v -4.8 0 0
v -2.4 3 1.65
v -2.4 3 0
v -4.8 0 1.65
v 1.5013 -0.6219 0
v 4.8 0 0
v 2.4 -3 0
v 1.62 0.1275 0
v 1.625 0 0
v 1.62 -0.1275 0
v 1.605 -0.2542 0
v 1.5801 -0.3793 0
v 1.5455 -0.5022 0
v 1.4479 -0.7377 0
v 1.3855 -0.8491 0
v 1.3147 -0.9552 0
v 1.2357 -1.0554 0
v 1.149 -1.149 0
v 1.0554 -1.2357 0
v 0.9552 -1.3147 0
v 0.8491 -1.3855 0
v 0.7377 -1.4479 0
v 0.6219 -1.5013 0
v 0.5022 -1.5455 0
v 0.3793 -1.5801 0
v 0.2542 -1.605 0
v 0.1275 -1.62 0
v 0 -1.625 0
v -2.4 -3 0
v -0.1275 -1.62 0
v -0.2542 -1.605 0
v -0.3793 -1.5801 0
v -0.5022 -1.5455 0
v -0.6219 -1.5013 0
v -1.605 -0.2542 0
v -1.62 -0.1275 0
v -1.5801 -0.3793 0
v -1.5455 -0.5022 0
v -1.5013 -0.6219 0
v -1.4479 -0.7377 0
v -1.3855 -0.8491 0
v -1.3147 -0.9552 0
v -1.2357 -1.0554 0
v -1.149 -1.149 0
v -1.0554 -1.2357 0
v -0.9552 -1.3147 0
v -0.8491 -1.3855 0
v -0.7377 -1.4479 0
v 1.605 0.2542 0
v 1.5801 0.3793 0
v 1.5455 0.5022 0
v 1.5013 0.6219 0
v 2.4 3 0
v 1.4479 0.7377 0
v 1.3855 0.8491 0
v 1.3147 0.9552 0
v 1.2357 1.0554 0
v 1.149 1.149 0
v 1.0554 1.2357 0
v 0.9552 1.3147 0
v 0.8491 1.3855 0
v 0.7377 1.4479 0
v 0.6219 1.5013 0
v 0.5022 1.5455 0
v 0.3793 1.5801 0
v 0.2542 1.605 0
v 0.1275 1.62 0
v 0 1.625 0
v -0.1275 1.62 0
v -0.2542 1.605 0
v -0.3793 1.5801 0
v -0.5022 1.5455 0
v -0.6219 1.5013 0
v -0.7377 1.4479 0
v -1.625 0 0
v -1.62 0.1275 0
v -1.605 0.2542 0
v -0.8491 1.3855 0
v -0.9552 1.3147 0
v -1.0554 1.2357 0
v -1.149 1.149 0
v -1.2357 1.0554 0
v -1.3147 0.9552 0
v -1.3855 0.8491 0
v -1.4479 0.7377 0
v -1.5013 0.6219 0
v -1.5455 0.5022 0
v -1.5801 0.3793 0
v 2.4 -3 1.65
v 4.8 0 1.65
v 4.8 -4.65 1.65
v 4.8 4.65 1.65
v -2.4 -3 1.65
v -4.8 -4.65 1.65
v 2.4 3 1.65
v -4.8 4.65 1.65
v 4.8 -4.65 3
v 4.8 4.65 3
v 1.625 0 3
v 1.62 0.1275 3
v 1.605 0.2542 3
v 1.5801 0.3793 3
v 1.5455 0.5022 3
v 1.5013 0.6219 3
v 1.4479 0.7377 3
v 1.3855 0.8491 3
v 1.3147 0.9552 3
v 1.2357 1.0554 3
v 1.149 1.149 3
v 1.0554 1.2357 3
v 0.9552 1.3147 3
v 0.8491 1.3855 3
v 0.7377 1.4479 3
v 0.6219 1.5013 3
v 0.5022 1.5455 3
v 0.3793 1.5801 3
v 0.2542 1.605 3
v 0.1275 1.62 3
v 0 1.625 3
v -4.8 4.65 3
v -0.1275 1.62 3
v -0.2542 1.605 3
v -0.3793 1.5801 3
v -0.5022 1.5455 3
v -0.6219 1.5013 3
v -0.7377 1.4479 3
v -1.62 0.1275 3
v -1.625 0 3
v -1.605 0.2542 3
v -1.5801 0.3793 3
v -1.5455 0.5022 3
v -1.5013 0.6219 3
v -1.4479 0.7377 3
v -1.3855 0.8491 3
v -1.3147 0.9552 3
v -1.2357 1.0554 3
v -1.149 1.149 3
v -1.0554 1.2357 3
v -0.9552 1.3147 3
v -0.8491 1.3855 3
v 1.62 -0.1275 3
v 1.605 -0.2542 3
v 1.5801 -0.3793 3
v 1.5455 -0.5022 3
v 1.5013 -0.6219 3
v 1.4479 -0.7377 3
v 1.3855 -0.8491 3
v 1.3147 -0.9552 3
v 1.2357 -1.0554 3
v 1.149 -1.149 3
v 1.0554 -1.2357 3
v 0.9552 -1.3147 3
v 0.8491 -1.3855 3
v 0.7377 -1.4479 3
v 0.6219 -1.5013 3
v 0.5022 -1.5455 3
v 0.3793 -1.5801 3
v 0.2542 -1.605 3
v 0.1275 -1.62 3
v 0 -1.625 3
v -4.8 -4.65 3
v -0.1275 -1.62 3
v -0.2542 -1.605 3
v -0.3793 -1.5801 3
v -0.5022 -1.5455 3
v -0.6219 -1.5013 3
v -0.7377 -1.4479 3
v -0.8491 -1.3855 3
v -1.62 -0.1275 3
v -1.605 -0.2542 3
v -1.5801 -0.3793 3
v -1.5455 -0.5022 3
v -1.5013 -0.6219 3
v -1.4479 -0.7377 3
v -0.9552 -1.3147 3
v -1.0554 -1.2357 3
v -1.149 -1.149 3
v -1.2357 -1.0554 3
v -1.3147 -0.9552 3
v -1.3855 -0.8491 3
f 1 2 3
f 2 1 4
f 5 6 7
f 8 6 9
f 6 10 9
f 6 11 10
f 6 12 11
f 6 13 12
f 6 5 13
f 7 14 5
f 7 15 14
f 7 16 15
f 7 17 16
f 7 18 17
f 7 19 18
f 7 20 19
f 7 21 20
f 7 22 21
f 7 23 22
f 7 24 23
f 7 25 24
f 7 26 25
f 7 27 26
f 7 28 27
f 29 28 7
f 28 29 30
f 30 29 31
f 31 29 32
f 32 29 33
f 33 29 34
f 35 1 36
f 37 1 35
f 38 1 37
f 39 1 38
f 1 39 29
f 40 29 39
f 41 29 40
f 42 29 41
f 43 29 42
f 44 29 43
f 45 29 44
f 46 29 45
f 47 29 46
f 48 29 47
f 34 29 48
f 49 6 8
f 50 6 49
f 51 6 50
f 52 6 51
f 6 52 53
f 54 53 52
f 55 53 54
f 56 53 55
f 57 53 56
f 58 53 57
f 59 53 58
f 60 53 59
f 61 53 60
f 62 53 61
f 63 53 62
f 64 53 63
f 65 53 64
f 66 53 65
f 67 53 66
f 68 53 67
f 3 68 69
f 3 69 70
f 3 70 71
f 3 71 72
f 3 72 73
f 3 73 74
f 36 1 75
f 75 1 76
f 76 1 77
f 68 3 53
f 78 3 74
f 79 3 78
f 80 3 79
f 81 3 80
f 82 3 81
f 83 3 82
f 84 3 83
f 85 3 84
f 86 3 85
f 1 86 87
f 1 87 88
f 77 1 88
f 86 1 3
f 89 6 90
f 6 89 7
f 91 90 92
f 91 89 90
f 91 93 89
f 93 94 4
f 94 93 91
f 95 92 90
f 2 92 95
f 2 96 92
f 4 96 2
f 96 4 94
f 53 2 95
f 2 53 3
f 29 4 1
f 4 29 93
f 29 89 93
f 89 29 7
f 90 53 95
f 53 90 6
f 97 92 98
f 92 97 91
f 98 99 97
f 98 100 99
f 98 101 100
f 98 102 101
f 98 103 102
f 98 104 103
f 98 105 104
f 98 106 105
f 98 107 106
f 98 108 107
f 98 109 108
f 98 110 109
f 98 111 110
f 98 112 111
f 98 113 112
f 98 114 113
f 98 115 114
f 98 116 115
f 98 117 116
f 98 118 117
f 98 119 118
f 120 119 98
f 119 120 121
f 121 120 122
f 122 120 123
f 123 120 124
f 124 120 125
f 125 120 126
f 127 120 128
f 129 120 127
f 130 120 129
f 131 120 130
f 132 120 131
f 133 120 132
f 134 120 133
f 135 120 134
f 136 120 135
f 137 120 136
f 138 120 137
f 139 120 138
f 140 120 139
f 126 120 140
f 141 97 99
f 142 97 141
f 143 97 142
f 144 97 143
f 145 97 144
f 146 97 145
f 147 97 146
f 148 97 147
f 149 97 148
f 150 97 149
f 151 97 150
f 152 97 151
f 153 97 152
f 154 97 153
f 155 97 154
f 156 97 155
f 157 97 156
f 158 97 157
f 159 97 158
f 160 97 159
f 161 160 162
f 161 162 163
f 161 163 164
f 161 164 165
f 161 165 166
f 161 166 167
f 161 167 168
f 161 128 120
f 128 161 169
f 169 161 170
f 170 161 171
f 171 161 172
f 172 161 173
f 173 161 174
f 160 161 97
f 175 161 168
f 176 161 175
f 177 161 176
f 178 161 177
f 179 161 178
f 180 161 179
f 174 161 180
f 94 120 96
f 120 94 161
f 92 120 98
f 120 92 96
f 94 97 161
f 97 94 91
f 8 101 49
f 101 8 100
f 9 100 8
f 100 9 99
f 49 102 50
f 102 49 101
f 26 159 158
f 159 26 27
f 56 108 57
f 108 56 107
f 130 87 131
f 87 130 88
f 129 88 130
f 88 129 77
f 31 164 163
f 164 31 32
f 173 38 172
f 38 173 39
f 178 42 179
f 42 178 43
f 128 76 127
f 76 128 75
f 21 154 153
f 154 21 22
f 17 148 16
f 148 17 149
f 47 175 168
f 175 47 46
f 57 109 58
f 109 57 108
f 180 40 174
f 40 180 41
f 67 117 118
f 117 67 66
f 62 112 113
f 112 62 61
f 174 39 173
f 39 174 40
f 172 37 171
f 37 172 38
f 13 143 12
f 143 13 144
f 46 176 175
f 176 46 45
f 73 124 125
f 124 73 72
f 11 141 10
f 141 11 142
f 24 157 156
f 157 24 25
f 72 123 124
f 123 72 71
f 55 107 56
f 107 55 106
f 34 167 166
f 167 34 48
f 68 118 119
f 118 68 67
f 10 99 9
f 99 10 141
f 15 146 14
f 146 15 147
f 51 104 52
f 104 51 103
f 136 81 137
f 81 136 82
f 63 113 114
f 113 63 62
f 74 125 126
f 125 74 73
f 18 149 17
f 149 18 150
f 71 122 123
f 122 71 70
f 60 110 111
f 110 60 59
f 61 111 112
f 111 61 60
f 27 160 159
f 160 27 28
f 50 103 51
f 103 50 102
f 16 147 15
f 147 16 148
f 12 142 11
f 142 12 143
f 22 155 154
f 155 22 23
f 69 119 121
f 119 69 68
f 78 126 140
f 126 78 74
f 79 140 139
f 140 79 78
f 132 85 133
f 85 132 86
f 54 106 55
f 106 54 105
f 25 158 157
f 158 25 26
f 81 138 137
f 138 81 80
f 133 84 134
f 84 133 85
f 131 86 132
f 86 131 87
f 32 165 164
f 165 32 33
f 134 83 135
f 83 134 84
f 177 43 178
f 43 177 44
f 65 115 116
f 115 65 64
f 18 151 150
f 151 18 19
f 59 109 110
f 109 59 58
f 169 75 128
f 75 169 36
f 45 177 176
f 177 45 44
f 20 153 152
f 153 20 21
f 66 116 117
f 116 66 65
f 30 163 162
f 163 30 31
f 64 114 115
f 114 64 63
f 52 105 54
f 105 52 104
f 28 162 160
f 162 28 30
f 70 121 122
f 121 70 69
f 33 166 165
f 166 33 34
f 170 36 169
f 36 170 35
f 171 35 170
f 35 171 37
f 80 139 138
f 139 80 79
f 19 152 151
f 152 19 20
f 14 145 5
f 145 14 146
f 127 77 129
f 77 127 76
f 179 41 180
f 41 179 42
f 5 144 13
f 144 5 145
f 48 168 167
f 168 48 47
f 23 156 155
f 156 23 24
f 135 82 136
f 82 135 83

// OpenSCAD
$fn = 80;

// T-slot nut for 3.0mm screws, 6.0mm across flats, 3.0mm thick
module t_slot_nut(af=6.0, thickness=3.0, screw_d=3.0, clearance=0.25) {

    // Geometry (printable generic T-slot nut)
    // - "across flats" implemented as a hex profile in plan view (Z extrusion)
    // - T-profile implemented by adding a wider top flange
    // - All Z translations are computed from thickness splits (no arbitrary offsets)

    flange_h = thickness * 0.45;
    body_h   = thickness - flange_h;

    // Length along slot (X)
    nut_len  = af * 1.6;

    // Hex body across-flats (Y direction in top view)
    // For a regular hex: across_flats = 2 * apothem
    apothem  = af / 2;
    hex_R    = apothem / cos(30); // circumradius

    // Flange width (Y) and length (X)
    flange_w = af * 1.55;
    flange_l = nut_len;

    hole_d   = screw_d + clearance;

    module hex_prism(h) {
        linear_extrude(height=h, center=true)
            polygon(points=[
                [ hex_R*cos(  0), hex_R*sin(  0)],
                [ hex_R*cos( 60), hex_R*sin( 60)],
                [ hex_R*cos(120), hex_R*sin(120)],
                [ hex_R*cos(180), hex_R*sin(180)],
                [ hex_R*cos(240), hex_R*sin(240)],
                [ hex_R*cos(300), hex_R*sin(300)]
            ]);
    }

    difference() {
        union() {
            // Main hex body (bottom)
            translate([0, 0, body_h/2])
                linear_extrude(height=body_h, center=true)
                    scale([nut_len/(2*hex_R), 1])  // stretch hex in X to nut_len
                        polygon(points=[
                            [ hex_R*cos(  0), hex_R*sin(  0)],
                            [ hex_R*cos( 60), hex_R*sin( 60)],
                            [ hex_R*cos(120), hex_R*sin(120)],
                            [ hex_R*cos(180), hex_R*sin(180)],
                            [ hex_R*cos(240), hex_R*sin(240)],
                            [ hex_R*cos(300), hex_R*sin(300)]
                        ]);

            // Top flange (wider "T" head), connected by exact stacking
            translate([0, 0, body_h + flange_h/2])
                cube([flange_l, flange_w, flange_h], center=true);
        }

        // Through hole for 3.0mm screw (clearance)
        translate([0, 0, thickness/2])
            cylinder(h=thickness + 0.6, d=hole_d, center=true);
    }
}

t_slot_nut();
